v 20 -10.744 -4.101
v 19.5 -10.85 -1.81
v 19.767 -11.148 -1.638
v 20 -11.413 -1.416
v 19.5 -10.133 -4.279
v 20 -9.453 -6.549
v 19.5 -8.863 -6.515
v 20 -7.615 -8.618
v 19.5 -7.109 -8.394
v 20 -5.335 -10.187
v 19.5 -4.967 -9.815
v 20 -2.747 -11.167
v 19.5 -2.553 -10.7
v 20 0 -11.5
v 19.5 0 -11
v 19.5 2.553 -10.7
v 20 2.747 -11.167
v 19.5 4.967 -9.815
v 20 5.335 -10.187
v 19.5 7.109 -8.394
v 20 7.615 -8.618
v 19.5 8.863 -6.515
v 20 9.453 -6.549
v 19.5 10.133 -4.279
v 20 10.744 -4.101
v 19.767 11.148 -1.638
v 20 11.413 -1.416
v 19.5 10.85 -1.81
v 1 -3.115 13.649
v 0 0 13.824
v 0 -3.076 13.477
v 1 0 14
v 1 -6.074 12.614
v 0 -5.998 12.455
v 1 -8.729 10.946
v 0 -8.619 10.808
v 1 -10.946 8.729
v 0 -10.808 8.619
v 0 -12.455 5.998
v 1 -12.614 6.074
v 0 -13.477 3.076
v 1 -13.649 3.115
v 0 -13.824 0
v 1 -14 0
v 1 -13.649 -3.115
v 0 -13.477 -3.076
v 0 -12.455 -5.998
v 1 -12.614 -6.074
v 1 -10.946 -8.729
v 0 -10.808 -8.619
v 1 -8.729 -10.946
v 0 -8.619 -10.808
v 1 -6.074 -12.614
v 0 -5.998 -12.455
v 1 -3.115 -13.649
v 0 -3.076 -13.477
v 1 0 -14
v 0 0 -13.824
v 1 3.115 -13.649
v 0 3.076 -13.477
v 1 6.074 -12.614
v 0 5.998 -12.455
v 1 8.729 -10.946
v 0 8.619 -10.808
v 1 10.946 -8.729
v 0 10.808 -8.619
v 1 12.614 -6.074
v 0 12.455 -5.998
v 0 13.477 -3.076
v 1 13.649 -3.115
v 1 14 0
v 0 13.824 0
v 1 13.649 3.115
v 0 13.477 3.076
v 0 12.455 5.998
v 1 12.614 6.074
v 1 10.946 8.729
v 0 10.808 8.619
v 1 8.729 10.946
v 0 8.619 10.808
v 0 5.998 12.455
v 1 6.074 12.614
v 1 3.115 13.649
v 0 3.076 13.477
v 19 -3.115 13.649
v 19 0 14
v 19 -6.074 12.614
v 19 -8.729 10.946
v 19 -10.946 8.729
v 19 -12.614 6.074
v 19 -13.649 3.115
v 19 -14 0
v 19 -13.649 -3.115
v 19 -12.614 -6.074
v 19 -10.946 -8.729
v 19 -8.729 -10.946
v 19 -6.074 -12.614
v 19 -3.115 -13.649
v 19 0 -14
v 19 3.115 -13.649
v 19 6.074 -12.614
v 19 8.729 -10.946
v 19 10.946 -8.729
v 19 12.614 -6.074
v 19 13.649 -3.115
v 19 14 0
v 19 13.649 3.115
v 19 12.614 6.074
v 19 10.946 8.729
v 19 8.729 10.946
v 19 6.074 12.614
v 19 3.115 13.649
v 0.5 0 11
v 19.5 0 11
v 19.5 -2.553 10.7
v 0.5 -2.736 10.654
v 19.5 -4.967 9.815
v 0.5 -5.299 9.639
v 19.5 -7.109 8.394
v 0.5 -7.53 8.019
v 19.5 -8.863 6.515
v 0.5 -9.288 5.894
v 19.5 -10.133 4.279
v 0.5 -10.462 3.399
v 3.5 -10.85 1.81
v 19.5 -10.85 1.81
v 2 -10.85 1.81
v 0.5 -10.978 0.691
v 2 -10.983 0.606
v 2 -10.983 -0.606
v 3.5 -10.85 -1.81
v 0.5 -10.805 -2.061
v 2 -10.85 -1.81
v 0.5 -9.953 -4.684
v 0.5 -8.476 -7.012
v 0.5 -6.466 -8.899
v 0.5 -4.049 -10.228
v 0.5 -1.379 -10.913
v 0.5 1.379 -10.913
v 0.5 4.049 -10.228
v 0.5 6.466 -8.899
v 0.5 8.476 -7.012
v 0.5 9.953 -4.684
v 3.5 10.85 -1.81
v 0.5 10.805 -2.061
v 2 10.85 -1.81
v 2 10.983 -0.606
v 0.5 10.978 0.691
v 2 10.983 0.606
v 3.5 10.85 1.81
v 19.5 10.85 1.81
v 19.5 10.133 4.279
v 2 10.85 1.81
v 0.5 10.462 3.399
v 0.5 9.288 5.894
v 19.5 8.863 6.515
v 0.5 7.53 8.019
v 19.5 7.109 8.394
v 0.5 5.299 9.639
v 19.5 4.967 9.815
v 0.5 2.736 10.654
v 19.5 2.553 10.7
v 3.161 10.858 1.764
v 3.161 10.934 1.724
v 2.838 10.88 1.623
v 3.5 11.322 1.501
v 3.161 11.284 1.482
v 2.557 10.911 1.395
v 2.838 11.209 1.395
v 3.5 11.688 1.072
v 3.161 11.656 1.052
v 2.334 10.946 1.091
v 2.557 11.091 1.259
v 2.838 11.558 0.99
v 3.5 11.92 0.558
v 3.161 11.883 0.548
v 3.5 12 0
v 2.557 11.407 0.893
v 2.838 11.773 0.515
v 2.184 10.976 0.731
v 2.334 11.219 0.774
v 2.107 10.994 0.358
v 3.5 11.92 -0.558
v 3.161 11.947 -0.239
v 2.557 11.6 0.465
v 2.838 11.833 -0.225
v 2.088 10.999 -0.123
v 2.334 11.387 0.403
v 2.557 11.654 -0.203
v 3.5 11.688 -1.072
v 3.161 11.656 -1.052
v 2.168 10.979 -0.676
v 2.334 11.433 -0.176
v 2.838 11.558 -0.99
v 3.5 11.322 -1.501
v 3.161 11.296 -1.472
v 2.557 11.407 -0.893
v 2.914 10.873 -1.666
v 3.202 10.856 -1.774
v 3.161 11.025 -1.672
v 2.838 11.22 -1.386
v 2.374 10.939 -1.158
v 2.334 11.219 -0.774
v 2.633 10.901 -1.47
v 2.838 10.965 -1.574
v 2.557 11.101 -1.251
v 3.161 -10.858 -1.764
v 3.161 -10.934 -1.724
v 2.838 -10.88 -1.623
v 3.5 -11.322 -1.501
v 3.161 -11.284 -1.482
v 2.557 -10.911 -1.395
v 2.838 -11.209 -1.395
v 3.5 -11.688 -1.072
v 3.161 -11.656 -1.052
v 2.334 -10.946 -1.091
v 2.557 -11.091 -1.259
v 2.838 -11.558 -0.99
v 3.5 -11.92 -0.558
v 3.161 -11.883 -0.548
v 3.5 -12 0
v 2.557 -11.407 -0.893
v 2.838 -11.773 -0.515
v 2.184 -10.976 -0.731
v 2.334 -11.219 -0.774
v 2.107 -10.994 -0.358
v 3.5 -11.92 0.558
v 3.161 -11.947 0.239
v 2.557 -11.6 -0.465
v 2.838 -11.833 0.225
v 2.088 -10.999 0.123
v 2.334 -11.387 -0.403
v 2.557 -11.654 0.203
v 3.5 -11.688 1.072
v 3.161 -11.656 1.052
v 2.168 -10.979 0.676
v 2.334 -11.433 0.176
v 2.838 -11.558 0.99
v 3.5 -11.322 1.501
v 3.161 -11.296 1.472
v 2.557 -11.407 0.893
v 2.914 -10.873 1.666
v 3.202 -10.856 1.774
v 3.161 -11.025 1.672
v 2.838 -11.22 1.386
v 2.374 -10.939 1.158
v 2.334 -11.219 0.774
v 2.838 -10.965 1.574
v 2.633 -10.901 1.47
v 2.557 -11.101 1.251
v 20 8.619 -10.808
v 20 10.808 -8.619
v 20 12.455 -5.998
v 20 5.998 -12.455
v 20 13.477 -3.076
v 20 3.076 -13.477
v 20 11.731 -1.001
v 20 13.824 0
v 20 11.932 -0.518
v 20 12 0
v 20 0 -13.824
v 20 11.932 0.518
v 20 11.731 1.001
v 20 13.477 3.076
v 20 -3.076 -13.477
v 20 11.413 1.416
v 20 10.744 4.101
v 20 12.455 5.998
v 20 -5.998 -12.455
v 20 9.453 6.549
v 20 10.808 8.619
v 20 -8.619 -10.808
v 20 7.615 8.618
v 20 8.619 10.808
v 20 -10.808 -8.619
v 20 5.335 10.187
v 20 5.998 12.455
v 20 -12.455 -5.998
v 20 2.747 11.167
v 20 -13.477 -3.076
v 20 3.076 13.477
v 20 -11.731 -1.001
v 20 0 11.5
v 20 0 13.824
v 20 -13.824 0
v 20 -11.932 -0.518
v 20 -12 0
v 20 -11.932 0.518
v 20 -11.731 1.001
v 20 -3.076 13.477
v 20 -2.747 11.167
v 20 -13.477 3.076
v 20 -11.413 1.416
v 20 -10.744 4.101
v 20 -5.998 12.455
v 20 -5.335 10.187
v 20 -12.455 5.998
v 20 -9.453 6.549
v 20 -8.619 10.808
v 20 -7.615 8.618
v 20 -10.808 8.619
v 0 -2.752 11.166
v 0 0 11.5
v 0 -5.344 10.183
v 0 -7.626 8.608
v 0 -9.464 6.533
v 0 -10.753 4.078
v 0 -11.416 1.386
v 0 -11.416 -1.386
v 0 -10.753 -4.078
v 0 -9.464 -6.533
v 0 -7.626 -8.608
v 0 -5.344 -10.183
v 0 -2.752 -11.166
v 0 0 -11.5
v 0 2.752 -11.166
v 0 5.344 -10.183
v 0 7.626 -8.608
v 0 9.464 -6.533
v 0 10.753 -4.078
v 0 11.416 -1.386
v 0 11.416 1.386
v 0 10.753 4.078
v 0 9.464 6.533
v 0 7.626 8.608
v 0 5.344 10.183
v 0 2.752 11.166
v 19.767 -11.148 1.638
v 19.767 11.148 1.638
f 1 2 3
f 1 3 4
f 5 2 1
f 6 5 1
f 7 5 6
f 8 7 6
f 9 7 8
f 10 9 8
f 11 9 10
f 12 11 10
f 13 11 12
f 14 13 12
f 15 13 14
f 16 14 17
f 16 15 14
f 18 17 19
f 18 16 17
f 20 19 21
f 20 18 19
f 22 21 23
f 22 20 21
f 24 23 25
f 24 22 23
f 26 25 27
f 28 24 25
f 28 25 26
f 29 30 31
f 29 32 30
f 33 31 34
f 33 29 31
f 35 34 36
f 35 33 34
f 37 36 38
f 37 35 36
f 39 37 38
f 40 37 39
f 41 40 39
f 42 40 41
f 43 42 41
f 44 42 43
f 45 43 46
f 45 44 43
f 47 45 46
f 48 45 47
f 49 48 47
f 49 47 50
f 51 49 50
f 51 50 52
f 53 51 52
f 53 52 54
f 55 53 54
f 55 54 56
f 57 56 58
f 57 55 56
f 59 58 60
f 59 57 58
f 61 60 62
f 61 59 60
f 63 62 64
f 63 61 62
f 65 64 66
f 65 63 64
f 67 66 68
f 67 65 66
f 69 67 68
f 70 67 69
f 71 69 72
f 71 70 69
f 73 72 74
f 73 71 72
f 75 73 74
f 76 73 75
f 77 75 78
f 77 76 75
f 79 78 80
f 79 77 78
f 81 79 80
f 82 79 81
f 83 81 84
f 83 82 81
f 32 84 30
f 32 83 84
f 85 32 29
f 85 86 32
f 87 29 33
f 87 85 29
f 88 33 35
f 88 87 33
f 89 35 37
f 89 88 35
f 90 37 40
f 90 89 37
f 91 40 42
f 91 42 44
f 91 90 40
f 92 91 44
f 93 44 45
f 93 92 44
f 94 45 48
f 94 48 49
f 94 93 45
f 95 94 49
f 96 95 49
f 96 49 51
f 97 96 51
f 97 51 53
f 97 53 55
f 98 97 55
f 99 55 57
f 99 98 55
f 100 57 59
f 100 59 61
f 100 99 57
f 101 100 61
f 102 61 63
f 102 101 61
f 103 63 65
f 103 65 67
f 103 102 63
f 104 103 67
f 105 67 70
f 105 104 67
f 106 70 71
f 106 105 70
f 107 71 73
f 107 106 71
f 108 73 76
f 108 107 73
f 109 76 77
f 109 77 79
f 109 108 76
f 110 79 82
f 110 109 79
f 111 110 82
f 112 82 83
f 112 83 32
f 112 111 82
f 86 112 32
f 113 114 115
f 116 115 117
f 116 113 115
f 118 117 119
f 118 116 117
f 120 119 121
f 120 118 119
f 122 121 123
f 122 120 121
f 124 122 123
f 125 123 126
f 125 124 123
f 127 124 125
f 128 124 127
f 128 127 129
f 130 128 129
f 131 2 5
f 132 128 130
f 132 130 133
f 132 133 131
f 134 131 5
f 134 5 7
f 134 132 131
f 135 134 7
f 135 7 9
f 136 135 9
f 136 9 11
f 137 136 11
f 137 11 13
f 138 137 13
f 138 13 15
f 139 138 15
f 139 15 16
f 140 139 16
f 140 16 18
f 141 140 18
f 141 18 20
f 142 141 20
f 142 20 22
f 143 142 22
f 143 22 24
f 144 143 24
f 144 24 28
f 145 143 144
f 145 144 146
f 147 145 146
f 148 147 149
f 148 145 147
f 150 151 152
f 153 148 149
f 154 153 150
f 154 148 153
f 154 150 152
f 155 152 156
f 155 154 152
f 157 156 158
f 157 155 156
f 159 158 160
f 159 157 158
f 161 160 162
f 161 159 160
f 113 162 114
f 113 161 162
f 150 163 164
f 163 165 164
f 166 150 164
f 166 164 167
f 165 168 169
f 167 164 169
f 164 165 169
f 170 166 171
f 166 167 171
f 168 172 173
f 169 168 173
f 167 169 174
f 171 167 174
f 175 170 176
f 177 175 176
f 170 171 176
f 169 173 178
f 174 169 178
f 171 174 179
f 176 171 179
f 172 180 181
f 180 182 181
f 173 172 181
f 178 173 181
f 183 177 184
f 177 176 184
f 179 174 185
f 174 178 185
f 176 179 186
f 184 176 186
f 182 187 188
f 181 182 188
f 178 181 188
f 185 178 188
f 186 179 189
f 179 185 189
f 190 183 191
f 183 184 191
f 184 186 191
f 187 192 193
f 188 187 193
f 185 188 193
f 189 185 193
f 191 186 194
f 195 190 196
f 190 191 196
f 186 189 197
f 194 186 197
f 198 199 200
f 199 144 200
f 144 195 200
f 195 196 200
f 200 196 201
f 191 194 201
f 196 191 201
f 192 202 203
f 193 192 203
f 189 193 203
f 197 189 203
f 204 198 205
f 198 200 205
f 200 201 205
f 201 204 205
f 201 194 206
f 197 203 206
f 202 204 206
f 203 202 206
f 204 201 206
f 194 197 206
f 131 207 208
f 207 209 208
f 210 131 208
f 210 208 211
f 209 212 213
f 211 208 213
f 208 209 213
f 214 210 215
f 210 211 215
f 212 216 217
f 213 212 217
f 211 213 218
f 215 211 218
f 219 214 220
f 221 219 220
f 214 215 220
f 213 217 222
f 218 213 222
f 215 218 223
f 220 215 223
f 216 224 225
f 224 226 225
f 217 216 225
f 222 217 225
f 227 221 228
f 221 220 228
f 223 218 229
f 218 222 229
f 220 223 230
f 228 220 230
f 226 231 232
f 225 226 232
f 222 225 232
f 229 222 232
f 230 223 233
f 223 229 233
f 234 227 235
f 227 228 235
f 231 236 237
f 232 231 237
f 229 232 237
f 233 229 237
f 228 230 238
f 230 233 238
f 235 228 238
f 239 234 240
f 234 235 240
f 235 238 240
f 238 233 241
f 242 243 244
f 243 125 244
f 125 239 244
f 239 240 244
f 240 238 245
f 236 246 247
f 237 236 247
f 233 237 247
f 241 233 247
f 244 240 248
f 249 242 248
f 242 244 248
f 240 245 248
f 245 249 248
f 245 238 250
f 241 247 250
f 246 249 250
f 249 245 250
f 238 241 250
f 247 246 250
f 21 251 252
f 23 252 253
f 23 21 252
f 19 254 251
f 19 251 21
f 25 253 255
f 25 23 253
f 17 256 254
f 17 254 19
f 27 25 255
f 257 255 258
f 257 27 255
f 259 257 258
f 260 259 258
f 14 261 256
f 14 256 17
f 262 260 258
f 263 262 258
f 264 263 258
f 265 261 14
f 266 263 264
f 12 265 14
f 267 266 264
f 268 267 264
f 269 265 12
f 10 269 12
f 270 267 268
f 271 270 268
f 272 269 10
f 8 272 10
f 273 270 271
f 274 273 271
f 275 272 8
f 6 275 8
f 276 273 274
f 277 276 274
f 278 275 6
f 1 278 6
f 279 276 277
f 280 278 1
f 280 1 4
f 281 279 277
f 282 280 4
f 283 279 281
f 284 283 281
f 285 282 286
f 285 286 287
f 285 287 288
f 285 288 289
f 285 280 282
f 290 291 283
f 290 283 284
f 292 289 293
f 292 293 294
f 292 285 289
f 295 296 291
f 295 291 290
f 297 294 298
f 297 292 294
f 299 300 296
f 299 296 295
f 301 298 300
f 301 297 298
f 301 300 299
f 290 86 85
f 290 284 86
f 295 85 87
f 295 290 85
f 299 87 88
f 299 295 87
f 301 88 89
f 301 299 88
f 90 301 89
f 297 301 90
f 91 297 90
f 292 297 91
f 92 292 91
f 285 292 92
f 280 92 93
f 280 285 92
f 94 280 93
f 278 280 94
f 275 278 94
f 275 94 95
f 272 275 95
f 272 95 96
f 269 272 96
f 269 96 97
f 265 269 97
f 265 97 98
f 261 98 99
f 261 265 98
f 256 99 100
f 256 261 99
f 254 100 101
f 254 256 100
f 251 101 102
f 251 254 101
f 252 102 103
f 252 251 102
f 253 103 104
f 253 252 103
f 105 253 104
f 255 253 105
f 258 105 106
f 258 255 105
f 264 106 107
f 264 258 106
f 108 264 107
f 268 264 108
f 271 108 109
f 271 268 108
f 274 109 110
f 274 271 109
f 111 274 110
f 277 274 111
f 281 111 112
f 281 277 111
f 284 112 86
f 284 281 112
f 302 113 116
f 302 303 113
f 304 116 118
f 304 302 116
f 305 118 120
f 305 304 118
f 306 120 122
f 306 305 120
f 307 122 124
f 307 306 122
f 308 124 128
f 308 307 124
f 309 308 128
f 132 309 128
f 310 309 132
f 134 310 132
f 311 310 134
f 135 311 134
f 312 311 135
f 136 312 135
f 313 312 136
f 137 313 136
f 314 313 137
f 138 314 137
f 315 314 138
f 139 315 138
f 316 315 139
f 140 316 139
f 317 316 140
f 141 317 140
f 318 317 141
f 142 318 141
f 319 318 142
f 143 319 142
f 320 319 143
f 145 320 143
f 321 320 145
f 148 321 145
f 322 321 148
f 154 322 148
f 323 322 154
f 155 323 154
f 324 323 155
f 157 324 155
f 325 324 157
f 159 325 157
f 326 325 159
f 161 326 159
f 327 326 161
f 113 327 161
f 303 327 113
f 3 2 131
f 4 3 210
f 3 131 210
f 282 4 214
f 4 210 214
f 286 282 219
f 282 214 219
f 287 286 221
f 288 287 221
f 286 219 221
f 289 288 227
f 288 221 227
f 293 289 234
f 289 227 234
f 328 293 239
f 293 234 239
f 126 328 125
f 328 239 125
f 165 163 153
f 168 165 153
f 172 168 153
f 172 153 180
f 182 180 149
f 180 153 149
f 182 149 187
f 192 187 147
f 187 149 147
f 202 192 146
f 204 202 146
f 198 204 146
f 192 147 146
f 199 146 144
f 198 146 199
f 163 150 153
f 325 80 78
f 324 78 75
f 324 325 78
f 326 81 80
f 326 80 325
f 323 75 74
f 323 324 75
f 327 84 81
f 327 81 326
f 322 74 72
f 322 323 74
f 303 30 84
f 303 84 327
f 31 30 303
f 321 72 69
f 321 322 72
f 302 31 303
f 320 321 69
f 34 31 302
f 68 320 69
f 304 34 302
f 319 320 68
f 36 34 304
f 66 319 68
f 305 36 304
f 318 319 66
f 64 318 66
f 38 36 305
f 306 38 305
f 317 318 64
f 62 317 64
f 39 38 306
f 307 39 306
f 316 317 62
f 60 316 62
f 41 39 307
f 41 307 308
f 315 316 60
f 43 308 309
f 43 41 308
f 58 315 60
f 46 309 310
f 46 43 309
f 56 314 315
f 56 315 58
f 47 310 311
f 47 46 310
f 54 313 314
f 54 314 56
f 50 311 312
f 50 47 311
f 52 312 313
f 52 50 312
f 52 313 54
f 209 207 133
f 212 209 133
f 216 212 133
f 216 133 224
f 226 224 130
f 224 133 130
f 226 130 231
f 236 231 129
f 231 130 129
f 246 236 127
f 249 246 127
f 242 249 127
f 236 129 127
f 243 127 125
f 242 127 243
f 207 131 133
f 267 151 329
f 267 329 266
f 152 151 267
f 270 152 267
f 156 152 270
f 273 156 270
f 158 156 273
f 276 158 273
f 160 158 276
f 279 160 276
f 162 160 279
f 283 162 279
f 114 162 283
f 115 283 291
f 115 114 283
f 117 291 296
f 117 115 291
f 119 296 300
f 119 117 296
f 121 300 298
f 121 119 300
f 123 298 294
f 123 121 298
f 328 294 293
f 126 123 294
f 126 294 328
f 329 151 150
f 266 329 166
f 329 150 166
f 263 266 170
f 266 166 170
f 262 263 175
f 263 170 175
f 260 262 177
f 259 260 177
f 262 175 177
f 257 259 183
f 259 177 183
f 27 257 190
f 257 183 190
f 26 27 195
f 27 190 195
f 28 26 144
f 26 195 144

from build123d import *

# Parameters (mm, degrees)
CUT_EXTRUDE_START   = -18
CUT_EXTRUDE_1_DEPTH = 18
FILLET_1_R          = 1.5


with BuildPart() as part:
    # Эскиз1 → Повернуть1 (revolve)
    with BuildSketch(Plane.XY, mode=Mode.PRIVATE) as revolve_1_sk:
        Polygon((0, 11.5), (0, 13.823673019), (1, 14), (19, 14), (20, 13.823673019), (20, 11.5), (19.5, 11), (0.5, 11), align=None)
    revolve(revolve_1_sk.sketch.rotate(Axis((-7.002814628, 0, 0), (1, 0, 0)), 90), axis=Axis((-7.002814628, 0, 0), (1, 0, 0)))

    # Эскиз2 → Вырез-Вытянуть1 (cut)
    with BuildSketch(Plane(origin=(20, 0, 0), x_dir=(0, 0, -1), z_dir=(1, 0, 0)).offset(CUT_EXTRUDE_START)):
        with BuildLine():
            ThreePointArc((-1.810386699, -10.85), (0, -11), (1.810386699, -10.85))
            ThreePointArc((1.810386699, -10.85), (0, -12), (-1.810386699, -10.85))
        make_face()
        with BuildLine():
            ThreePointArc((-1.810386699, 10.85), (0, 12), (1.810386699, 10.85))
            ThreePointArc((1.810386699, 10.85), (0, 11), (-1.810386699, 10.85))
        make_face()
    extrude(amount=CUT_EXTRUDE_1_DEPTH, mode=Mode.SUBTRACT)

    # Скругление1
    # the kernel refuses this fillet: 1.5 mm, written as the material it adds along each edge
    with BuildSketch(Plane(origin=(2, 10, 0), x_dir=(0, -0.9911428491773114, 0.132800047156171), z_dir=(0, -0.132800047156171, -0.9911428491773114))) as fillet_1_piece_1_section:
        with BuildLine():
            CenterArc((2 - FILLET_1_R, -FILLET_1_R), FILLET_1_R, 0, 90)
            Line((2, -FILLET_1_R), (2, 0))
            Line((2, 0), (2 - FILLET_1_R, 0))
        make_face()
    fillet_1_piece_1 = revolve(axis=Axis((2, 10, 0), (-1, 0, 0)), revolution_arc=344.737147097, mode=Mode.PRIVATE)
    fillet_1_piece_1 = fillet_1_piece_1 - Plane(origin=(2.626804304, 0, 0), x_dir=(0, 0, 1), z_dir=(-1, 0, 0)) * Cylinder(11, 8, mode=Mode.PRIVATE)
    add(fillet_1_piece_1)
    with BuildSketch(Plane(origin=(2, -10, 0), x_dir=(0, 0.9911428491773114, -0.132800047156171), z_dir=(0, 0.132800047156171, 0.9911428491773114))) as fillet_1_piece_2_section:
        with BuildLine():
            CenterArc((2 - FILLET_1_R, -FILLET_1_R), FILLET_1_R, 0, 90)
            Line((2, -FILLET_1_R), (2, 0))
            Line((2, 0), (2 - FILLET_1_R, 0))
        make_face()
    fillet_1_piece_2 = revolve(axis=Axis((2, -10, 0), (-1, 0, 0)), revolution_arc=344.737147097, mode=Mode.PRIVATE)
    fillet_1_piece_2 = fillet_1_piece_2 - Plane(origin=(2.626804304, 0, 0), x_dir=(0, 0, 1), z_dir=(-1, 0, 0)) * Cylinder(11, 8, mode=Mode.PRIVATE)
    add(fillet_1_piece_2)


solid = part.part
